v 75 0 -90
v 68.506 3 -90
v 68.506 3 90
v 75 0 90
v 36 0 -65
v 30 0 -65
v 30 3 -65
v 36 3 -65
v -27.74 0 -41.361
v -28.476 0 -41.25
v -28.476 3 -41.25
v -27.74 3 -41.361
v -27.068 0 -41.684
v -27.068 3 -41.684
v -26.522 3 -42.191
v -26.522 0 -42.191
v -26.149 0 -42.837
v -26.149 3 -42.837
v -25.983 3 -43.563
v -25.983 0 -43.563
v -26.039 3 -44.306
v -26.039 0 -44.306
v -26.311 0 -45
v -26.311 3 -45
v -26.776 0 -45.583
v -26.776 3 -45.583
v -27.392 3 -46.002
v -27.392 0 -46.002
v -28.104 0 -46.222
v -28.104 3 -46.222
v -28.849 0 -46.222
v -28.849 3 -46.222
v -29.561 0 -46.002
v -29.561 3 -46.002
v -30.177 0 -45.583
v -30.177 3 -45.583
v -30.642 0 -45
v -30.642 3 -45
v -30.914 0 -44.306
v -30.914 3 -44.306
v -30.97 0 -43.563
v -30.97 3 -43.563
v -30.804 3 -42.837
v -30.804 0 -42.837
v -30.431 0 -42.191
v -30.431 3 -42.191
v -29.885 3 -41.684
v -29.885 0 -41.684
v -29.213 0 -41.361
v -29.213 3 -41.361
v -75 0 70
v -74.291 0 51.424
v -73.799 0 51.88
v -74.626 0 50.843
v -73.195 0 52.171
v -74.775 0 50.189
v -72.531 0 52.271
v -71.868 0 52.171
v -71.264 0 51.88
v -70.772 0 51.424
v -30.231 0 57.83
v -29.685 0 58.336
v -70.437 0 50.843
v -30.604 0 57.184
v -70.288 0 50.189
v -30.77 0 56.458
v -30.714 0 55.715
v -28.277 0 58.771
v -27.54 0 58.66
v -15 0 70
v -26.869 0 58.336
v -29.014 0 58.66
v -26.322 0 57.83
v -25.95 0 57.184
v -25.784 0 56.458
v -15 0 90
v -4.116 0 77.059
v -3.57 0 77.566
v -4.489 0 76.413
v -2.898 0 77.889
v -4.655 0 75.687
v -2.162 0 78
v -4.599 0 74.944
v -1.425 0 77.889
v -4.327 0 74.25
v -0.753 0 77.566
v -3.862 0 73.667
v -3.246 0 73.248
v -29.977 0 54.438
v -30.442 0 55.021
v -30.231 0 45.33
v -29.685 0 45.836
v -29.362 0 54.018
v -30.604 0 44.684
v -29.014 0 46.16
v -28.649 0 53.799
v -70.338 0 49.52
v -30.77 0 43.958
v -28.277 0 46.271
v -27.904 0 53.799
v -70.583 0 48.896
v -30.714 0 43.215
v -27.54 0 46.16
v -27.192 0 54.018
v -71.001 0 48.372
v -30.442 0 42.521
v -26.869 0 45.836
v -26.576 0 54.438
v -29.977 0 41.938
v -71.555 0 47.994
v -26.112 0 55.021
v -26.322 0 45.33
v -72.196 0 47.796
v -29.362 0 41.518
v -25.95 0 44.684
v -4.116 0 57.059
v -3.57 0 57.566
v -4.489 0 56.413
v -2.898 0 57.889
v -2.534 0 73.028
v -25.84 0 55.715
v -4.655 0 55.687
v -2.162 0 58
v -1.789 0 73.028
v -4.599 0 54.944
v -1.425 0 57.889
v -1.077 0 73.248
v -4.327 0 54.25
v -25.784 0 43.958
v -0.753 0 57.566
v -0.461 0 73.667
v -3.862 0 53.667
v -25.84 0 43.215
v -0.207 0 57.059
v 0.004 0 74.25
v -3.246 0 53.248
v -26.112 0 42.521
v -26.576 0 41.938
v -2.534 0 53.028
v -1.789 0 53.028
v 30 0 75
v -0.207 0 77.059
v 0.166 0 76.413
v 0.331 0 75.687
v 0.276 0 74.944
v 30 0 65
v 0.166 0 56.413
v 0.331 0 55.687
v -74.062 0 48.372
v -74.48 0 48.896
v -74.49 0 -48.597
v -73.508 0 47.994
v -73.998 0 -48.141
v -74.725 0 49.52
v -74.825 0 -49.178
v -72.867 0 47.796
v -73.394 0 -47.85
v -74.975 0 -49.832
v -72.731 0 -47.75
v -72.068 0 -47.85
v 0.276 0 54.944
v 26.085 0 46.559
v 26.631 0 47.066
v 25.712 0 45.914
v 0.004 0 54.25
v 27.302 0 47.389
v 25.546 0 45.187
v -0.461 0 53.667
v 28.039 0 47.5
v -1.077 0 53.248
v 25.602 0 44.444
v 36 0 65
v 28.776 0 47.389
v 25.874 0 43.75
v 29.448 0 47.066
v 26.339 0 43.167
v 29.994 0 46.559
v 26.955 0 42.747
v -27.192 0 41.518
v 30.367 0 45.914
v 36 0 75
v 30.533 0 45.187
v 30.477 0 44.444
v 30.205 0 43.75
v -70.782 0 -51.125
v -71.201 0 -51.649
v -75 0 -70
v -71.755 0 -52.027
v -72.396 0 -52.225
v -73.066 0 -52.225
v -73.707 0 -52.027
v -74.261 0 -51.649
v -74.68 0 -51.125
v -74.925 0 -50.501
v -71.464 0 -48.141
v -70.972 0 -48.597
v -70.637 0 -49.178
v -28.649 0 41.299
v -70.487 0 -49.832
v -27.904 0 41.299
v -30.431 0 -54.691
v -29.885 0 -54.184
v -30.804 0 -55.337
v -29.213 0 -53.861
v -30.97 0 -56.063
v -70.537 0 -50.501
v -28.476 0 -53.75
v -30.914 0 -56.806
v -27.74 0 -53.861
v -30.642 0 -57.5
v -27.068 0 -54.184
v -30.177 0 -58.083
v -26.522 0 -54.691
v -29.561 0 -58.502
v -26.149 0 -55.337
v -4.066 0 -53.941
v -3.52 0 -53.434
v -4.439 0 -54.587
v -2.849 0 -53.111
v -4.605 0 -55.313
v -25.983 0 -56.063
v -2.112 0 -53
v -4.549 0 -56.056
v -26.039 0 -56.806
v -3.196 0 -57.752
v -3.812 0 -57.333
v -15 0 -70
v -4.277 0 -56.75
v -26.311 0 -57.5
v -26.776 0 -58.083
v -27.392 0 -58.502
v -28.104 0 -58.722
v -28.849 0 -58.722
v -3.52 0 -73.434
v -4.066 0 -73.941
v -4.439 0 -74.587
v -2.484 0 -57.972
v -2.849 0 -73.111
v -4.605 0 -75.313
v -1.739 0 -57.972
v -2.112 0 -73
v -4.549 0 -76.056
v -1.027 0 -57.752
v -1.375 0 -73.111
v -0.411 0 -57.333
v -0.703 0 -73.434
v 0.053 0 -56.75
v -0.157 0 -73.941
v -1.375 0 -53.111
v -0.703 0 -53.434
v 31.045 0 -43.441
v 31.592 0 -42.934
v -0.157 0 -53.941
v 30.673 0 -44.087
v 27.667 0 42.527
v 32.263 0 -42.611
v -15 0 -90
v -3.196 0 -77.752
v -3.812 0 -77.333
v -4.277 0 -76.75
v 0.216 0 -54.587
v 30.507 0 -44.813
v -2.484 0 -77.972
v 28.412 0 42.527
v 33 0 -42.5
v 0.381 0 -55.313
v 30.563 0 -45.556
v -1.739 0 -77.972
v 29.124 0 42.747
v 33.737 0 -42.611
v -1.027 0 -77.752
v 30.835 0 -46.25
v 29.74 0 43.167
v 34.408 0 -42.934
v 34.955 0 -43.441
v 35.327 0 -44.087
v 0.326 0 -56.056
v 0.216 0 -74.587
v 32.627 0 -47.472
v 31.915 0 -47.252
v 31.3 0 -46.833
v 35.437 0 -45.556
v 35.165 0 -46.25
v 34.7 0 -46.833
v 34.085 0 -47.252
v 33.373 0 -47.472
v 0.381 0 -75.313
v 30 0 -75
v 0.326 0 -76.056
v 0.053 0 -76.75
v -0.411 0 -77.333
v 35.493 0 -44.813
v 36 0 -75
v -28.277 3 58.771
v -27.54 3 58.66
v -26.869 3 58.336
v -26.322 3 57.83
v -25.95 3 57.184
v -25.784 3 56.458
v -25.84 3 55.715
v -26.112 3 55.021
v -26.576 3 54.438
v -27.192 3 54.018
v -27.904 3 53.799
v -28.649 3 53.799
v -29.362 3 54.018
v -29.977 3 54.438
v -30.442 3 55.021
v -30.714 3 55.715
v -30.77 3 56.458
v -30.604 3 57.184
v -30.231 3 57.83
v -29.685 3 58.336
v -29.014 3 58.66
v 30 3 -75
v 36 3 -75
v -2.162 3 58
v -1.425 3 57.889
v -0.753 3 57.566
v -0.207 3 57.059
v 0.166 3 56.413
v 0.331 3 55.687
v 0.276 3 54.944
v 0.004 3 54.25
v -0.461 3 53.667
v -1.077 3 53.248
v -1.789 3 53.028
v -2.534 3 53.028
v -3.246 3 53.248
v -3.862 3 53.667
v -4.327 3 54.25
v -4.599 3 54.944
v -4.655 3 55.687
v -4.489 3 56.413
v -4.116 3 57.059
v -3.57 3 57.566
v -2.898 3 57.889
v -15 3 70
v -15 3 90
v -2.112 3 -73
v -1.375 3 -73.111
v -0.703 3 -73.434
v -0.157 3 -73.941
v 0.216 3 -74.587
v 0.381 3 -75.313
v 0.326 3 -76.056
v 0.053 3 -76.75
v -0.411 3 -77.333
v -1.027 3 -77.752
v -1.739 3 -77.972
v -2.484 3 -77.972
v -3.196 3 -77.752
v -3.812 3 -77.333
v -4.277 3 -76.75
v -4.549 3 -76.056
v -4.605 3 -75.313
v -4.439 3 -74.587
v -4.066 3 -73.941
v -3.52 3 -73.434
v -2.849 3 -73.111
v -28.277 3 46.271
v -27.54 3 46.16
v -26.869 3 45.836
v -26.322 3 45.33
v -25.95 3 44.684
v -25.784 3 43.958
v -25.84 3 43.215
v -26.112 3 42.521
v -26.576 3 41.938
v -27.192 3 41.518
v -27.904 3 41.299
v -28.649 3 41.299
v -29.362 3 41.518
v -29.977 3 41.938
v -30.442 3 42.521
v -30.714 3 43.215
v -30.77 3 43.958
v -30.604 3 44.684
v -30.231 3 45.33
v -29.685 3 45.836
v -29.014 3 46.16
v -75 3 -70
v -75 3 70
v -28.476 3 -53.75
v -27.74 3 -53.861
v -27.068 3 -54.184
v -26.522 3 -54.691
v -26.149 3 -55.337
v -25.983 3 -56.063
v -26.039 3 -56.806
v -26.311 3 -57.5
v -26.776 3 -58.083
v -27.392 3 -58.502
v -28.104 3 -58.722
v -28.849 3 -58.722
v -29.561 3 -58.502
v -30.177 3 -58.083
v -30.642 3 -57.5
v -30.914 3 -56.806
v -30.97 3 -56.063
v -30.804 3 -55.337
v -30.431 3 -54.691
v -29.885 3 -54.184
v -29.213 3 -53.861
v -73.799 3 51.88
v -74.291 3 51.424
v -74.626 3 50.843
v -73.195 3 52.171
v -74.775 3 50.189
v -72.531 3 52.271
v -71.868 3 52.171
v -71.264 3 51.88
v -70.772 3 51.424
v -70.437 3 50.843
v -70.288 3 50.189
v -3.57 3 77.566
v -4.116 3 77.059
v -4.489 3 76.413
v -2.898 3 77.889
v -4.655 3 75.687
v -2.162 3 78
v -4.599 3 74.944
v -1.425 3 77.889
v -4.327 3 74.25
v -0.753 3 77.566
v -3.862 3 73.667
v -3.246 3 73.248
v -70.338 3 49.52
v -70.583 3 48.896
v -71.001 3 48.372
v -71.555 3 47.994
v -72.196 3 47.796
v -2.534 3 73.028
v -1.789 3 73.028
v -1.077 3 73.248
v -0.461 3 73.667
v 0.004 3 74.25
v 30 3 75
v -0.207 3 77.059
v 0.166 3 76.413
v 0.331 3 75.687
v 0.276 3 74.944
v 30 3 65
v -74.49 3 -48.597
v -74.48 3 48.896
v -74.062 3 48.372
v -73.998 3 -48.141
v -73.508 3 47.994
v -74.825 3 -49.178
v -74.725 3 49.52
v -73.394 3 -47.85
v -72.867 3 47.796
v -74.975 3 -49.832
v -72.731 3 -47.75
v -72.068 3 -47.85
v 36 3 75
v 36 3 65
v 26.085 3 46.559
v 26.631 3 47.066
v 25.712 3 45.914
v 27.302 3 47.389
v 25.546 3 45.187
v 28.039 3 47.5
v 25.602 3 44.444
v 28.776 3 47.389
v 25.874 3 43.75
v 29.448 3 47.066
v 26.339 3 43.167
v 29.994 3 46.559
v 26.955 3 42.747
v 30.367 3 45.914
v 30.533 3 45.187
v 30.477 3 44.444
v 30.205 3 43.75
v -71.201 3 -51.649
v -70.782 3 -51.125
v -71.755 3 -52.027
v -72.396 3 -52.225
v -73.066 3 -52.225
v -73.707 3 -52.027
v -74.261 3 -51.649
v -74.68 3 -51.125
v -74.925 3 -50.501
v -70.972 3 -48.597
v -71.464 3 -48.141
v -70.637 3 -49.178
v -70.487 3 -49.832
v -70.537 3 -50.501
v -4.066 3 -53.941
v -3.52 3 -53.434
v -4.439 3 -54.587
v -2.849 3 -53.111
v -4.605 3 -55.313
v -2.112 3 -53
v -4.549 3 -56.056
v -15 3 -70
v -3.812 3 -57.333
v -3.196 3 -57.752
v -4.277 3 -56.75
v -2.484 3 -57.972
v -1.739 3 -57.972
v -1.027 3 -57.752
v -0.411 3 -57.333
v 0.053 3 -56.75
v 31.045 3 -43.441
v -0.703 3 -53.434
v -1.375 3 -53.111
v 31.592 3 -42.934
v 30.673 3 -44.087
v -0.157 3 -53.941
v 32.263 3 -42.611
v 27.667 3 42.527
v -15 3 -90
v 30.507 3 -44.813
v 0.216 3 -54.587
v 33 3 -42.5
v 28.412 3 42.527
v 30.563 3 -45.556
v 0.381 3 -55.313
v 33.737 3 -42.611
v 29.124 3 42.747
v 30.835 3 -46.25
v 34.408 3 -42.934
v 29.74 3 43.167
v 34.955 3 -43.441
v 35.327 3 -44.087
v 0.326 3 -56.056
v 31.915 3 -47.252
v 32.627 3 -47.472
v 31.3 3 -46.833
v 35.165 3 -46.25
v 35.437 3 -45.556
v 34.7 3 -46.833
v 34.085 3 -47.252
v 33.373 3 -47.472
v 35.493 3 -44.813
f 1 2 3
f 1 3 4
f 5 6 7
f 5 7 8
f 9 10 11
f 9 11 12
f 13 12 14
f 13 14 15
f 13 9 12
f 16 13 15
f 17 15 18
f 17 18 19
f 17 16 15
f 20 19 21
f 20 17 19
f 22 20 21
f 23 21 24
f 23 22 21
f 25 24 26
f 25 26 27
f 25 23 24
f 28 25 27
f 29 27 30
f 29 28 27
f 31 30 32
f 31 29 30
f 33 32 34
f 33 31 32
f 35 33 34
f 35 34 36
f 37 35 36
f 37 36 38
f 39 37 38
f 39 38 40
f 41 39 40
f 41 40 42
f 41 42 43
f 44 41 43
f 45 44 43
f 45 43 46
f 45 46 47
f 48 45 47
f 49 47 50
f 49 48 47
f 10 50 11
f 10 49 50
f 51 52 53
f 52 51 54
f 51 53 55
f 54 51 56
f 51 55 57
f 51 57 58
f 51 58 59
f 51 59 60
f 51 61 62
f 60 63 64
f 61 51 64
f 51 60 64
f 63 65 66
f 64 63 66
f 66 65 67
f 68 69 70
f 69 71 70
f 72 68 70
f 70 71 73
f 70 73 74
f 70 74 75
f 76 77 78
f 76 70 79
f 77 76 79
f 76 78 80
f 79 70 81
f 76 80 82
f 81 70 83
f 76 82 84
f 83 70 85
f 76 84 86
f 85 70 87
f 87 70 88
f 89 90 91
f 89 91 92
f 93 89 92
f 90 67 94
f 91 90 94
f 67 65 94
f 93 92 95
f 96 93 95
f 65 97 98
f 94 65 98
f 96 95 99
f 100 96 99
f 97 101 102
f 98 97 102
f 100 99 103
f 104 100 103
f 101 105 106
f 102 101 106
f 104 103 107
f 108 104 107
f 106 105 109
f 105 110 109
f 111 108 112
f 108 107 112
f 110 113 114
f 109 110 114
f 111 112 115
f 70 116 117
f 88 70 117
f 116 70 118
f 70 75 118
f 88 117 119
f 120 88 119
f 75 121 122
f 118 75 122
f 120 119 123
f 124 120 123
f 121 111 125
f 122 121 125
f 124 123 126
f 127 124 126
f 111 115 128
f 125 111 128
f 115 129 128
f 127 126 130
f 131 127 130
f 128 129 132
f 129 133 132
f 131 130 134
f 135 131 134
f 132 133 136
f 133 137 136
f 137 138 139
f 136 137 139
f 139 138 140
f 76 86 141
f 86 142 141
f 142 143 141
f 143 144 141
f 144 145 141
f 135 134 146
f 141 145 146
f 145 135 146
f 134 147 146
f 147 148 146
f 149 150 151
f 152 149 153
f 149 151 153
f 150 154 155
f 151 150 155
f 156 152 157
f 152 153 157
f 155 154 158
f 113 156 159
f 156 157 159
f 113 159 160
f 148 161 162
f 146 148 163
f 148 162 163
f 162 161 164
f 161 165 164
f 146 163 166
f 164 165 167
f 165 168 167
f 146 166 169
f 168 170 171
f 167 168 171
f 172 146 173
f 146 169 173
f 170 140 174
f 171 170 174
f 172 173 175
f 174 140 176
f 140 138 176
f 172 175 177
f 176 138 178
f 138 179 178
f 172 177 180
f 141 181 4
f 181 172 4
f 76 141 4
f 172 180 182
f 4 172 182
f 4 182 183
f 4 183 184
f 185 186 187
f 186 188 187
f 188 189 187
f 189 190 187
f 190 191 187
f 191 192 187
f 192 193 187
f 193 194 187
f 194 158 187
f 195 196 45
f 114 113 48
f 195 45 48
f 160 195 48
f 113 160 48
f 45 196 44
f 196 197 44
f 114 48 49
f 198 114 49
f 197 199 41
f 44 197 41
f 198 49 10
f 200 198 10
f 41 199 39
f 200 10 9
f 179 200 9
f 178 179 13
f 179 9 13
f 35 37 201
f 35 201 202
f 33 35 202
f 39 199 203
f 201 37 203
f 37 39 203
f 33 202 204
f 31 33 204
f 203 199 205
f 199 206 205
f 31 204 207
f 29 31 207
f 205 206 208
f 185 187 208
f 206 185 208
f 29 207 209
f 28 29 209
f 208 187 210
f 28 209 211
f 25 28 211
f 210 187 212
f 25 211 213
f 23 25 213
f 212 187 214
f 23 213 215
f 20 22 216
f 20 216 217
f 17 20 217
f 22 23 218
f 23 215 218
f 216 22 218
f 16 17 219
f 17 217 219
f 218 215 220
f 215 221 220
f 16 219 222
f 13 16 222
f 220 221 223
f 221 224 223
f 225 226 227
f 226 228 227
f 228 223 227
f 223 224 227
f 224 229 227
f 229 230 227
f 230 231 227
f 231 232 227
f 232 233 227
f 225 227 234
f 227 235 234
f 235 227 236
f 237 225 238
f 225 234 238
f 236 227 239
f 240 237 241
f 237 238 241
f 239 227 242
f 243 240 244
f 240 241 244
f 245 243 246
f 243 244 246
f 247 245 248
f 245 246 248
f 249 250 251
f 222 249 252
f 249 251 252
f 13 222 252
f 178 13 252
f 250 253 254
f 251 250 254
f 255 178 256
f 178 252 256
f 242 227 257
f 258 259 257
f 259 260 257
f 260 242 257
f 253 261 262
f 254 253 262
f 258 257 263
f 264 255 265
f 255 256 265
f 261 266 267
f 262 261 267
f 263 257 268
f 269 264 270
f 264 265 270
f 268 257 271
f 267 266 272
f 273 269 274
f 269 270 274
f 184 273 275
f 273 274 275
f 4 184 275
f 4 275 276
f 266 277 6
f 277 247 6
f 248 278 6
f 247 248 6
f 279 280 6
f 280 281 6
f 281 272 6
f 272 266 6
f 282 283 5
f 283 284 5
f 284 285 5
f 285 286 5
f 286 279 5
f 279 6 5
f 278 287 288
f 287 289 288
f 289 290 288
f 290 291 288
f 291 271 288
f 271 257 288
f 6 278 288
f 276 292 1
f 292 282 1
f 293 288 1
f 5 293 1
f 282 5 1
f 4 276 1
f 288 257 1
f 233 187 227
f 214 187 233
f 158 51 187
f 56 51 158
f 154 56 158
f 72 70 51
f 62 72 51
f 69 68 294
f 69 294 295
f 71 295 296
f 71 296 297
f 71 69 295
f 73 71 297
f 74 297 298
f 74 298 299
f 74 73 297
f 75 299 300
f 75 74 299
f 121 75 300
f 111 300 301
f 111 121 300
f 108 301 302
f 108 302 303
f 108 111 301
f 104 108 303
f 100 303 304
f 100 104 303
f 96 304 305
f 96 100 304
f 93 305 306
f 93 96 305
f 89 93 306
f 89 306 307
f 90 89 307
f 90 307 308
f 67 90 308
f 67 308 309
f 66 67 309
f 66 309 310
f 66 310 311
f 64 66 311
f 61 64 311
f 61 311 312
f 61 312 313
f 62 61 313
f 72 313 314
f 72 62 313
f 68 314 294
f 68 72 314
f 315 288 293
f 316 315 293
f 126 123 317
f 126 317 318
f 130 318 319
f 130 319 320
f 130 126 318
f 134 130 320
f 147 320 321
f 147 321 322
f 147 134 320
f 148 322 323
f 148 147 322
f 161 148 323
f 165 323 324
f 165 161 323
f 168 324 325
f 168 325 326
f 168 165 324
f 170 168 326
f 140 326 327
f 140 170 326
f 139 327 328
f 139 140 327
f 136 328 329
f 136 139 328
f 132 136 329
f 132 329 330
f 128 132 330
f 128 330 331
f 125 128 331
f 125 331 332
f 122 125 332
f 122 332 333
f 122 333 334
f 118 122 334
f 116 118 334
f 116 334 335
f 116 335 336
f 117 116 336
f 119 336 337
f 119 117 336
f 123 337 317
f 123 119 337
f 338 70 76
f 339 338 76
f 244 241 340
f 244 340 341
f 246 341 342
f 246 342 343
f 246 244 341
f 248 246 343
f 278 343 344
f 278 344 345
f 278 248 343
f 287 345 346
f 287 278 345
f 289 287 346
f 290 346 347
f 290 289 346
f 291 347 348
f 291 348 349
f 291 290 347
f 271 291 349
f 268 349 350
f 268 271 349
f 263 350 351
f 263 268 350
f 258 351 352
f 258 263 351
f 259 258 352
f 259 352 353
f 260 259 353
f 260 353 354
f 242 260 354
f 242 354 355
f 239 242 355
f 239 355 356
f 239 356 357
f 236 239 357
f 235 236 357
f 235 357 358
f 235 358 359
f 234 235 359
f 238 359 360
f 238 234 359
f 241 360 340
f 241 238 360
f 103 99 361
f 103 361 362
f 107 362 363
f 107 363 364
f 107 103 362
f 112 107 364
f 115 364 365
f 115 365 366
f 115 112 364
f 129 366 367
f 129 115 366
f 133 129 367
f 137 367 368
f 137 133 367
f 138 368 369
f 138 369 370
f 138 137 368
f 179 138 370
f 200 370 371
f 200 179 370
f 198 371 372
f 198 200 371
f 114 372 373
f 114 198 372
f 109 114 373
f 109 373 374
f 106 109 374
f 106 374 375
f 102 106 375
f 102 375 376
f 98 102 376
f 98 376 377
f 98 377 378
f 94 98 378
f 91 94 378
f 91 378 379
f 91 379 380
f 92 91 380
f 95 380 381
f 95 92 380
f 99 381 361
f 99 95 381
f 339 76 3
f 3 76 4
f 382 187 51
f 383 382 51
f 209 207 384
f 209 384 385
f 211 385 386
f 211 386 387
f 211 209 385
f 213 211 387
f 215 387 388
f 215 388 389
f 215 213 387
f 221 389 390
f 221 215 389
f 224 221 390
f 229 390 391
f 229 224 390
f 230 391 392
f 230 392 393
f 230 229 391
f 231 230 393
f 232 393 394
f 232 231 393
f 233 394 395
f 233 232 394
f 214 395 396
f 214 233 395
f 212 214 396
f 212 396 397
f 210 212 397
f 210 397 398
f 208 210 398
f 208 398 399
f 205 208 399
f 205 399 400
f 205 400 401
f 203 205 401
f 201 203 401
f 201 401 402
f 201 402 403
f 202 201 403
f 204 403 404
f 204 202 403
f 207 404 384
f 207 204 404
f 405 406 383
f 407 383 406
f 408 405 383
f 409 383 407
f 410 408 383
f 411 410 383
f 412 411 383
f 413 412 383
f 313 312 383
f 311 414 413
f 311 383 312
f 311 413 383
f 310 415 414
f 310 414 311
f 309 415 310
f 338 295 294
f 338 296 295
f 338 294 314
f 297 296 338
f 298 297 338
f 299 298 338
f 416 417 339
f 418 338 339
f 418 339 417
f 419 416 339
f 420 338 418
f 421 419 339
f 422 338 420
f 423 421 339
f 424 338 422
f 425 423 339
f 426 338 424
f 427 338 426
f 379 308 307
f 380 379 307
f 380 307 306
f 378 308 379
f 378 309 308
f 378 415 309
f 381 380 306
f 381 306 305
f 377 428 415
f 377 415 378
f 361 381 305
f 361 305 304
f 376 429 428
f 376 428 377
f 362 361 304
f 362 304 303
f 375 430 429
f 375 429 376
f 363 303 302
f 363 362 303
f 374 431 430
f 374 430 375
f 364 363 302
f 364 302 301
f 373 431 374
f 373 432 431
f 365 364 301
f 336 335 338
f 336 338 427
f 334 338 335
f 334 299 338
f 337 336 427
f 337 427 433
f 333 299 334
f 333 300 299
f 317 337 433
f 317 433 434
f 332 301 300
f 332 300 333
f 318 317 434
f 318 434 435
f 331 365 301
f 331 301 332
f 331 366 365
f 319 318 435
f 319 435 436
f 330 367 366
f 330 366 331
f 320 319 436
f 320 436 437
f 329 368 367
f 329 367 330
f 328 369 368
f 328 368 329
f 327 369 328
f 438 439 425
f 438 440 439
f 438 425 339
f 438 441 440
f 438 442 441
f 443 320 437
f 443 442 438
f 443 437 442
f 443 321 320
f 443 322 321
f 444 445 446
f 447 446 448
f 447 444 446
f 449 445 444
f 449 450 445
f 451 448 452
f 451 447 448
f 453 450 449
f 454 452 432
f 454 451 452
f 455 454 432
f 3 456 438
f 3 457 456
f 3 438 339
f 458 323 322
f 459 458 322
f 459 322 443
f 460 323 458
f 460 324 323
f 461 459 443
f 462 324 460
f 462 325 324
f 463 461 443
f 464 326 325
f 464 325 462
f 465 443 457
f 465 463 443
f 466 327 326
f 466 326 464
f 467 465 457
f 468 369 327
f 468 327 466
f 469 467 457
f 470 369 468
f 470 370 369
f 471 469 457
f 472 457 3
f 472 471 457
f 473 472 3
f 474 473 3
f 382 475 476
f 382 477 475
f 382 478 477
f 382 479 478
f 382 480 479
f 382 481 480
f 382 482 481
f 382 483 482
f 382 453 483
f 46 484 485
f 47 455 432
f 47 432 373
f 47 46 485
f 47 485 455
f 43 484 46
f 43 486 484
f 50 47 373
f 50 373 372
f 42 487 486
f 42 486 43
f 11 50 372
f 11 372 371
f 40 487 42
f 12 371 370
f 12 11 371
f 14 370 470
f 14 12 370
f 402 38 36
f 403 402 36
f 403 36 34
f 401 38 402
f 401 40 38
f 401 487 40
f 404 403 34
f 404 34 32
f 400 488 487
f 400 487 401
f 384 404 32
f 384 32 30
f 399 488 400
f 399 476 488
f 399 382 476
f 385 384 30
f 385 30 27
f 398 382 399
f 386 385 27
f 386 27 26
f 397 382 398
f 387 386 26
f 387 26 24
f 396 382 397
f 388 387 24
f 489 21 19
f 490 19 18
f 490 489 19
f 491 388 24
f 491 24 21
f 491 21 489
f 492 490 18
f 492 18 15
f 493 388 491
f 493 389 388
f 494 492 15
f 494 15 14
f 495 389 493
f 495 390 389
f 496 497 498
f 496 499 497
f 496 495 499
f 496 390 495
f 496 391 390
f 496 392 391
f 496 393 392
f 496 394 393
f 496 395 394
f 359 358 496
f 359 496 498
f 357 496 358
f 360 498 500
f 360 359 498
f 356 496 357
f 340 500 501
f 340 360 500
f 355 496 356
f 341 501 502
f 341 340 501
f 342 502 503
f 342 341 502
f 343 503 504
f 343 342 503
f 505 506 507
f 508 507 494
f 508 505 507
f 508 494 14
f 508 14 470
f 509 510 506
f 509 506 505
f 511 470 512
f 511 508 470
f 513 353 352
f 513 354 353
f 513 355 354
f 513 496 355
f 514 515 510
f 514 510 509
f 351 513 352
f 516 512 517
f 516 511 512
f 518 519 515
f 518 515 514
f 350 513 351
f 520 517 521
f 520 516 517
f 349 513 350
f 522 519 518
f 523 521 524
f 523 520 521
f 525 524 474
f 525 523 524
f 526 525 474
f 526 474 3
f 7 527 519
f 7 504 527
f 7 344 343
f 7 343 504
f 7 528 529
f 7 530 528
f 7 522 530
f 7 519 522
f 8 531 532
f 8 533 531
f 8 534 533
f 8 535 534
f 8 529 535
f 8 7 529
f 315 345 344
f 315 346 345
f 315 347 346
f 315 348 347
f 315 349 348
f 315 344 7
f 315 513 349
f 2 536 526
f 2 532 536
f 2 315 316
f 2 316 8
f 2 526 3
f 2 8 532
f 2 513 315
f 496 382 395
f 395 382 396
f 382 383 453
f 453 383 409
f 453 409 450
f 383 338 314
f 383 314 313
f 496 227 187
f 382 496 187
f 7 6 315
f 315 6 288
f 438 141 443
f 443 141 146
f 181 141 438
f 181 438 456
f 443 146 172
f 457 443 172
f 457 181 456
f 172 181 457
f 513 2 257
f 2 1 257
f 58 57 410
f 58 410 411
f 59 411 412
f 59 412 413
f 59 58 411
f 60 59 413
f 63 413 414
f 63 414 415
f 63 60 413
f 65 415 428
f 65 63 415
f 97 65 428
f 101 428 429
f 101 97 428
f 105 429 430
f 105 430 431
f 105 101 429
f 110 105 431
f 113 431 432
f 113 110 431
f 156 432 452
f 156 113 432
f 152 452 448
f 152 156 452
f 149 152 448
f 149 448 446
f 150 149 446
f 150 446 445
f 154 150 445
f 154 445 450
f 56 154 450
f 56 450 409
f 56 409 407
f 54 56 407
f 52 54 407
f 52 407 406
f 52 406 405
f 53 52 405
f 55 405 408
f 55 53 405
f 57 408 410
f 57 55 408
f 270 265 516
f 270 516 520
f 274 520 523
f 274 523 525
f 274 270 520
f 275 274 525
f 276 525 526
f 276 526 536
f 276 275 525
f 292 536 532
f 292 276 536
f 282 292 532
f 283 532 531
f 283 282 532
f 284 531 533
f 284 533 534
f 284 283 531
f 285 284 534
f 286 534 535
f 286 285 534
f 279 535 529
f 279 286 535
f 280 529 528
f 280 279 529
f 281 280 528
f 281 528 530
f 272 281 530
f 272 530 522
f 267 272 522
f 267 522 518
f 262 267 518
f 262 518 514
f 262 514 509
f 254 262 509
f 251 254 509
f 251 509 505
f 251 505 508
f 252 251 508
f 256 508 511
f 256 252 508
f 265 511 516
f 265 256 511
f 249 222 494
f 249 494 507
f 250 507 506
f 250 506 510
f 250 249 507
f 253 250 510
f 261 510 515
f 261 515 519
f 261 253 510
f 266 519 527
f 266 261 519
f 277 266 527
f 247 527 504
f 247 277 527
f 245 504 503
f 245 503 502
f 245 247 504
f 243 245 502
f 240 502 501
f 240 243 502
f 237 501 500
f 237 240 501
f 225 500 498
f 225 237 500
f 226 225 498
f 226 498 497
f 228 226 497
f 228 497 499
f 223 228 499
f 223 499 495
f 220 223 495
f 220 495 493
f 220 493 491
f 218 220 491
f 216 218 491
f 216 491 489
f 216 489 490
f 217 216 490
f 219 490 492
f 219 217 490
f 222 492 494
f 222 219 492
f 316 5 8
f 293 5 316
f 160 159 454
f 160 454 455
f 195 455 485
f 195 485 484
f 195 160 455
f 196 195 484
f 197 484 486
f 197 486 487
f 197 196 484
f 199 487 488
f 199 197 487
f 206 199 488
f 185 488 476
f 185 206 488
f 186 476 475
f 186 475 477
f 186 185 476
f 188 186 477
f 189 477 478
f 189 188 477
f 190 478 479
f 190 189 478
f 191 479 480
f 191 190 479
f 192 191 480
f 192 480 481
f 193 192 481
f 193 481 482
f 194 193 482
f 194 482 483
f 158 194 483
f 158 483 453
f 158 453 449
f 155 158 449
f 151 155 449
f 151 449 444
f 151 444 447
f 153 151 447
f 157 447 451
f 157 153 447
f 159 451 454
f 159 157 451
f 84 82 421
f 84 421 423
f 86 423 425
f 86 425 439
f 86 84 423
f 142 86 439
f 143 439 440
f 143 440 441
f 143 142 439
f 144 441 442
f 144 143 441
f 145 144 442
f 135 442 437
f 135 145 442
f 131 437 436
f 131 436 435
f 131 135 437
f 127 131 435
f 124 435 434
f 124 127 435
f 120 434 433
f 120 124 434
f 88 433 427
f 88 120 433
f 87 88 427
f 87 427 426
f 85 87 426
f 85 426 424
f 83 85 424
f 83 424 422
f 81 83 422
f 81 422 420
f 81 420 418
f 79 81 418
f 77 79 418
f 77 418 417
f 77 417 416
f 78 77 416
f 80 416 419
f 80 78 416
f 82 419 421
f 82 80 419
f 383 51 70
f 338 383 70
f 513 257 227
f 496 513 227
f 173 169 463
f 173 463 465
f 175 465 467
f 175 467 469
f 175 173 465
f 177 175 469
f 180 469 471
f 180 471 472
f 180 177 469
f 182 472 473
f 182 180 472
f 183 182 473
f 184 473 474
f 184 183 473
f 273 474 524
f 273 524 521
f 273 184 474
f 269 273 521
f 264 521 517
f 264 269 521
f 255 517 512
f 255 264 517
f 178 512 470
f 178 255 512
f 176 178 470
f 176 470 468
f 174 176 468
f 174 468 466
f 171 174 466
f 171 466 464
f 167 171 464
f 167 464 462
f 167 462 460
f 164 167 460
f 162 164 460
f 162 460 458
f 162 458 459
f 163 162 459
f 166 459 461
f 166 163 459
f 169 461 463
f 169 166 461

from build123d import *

# Parameters (mm, degrees)
ESQUISSE1_R             = 2.25
ESQUISSE1_R_2           = 2.5
ESQUISSE1_W             = 6
ESQUISSE1_H             = 10
ESQUISSE1_R_3           = 2.500458525
BOSS_EXTRU_1_DEPTH      = 3
ENL_V_MAT_EXTRU_2_DEPTH = 216


with BuildPart() as part:
    # Esquisse1 → Boss.-Extru.1 (new body)
    with BuildSketch(Plane(origin=(0, 0, 0), x_dir=(1, 0, 0), z_dir=(0, 1, 0))):
        Polygon((-15, -90), (75, -90), (75, 90), (-15, 90), (-15, 70), (-75, 70), (-75, -70), (-15, -70), align=None)
        with Locations(Location((-72.531396859, -50.020890538, 0), (0, 0, 270))):
            Circle(ESQUISSE1_R, mode=Mode.SUBTRACT)
        with Locations(Location((-2.161539128, -75.5, 0), (0, 0, 270))):
            Circle(ESQUISSE1_R_2, mode=Mode.SUBTRACT)
        with Locations(Location((-28.276866627, -56.270890538, 0), (0, 0, 270))):
            Circle(ESQUISSE1_R_2, mode=Mode.SUBTRACT)
        with Locations(Location((-2.161539128, -55.5, 0), (0, 0, 270))):
            Circle(ESQUISSE1_R_2, mode=Mode.SUBTRACT)
        with Locations(Location((-28.276866627, -43.770890538, 0), (0, 0, 270))):
            Circle(ESQUISSE1_R_2, mode=Mode.SUBTRACT)
        with Locations((33, -70)):
            Rectangle(ESQUISSE1_W, ESQUISSE1_H, mode=Mode.SUBTRACT)
        with Locations(Location((28.039441899, -45, 0), (0, 0, 270))):
            Circle(ESQUISSE1_R_3, mode=Mode.SUBTRACT)
        with Locations(Location((-28.476498774, 43.75, 0), (0, 0, 270))):
            Circle(ESQUISSE1_R_2, mode=Mode.SUBTRACT)
        with Locations(Location((-72.731029006, 50, 0), (0, 0, 270))):
            Circle(ESQUISSE1_R, mode=Mode.SUBTRACT)
        with Locations(Location((-28.476498774, 56.25, 0), (0, 0, 270))):
            Circle(ESQUISSE1_R_2, mode=Mode.SUBTRACT)
        with Locations(Location((-2.111629991, 55.5, 0), (0, 0, 270))):
            Circle(ESQUISSE1_R_2, mode=Mode.SUBTRACT)
        with Locations(Location((-2.111629991, 75.5, 0), (0, 0, 270))):
            Circle(ESQUISSE1_R_2, mode=Mode.SUBTRACT)
        with Locations(Location((33, 45, 0), (0, 0, 270))):
            Circle(ESQUISSE1_R_2, mode=Mode.SUBTRACT)
        with Locations((33, 70)):
            Rectangle(ESQUISSE1_W, ESQUISSE1_H, mode=Mode.SUBTRACT)
    extrude(amount=BOSS_EXTRU_1_DEPTH)

    # Esquisse4 → Enlèv. mat.-Extru.2 (cut)
    with BuildSketch(Plane.XY.offset(90)):
        Polygon((68.505970044, 3), (75, 0), (83.303291845, 0), (76.039441899, 3), align=None)
    extrude(amount=-ENL_V_MAT_EXTRU_2_DEPTH, mode=Mode.SUBTRACT)


solid = part.part
